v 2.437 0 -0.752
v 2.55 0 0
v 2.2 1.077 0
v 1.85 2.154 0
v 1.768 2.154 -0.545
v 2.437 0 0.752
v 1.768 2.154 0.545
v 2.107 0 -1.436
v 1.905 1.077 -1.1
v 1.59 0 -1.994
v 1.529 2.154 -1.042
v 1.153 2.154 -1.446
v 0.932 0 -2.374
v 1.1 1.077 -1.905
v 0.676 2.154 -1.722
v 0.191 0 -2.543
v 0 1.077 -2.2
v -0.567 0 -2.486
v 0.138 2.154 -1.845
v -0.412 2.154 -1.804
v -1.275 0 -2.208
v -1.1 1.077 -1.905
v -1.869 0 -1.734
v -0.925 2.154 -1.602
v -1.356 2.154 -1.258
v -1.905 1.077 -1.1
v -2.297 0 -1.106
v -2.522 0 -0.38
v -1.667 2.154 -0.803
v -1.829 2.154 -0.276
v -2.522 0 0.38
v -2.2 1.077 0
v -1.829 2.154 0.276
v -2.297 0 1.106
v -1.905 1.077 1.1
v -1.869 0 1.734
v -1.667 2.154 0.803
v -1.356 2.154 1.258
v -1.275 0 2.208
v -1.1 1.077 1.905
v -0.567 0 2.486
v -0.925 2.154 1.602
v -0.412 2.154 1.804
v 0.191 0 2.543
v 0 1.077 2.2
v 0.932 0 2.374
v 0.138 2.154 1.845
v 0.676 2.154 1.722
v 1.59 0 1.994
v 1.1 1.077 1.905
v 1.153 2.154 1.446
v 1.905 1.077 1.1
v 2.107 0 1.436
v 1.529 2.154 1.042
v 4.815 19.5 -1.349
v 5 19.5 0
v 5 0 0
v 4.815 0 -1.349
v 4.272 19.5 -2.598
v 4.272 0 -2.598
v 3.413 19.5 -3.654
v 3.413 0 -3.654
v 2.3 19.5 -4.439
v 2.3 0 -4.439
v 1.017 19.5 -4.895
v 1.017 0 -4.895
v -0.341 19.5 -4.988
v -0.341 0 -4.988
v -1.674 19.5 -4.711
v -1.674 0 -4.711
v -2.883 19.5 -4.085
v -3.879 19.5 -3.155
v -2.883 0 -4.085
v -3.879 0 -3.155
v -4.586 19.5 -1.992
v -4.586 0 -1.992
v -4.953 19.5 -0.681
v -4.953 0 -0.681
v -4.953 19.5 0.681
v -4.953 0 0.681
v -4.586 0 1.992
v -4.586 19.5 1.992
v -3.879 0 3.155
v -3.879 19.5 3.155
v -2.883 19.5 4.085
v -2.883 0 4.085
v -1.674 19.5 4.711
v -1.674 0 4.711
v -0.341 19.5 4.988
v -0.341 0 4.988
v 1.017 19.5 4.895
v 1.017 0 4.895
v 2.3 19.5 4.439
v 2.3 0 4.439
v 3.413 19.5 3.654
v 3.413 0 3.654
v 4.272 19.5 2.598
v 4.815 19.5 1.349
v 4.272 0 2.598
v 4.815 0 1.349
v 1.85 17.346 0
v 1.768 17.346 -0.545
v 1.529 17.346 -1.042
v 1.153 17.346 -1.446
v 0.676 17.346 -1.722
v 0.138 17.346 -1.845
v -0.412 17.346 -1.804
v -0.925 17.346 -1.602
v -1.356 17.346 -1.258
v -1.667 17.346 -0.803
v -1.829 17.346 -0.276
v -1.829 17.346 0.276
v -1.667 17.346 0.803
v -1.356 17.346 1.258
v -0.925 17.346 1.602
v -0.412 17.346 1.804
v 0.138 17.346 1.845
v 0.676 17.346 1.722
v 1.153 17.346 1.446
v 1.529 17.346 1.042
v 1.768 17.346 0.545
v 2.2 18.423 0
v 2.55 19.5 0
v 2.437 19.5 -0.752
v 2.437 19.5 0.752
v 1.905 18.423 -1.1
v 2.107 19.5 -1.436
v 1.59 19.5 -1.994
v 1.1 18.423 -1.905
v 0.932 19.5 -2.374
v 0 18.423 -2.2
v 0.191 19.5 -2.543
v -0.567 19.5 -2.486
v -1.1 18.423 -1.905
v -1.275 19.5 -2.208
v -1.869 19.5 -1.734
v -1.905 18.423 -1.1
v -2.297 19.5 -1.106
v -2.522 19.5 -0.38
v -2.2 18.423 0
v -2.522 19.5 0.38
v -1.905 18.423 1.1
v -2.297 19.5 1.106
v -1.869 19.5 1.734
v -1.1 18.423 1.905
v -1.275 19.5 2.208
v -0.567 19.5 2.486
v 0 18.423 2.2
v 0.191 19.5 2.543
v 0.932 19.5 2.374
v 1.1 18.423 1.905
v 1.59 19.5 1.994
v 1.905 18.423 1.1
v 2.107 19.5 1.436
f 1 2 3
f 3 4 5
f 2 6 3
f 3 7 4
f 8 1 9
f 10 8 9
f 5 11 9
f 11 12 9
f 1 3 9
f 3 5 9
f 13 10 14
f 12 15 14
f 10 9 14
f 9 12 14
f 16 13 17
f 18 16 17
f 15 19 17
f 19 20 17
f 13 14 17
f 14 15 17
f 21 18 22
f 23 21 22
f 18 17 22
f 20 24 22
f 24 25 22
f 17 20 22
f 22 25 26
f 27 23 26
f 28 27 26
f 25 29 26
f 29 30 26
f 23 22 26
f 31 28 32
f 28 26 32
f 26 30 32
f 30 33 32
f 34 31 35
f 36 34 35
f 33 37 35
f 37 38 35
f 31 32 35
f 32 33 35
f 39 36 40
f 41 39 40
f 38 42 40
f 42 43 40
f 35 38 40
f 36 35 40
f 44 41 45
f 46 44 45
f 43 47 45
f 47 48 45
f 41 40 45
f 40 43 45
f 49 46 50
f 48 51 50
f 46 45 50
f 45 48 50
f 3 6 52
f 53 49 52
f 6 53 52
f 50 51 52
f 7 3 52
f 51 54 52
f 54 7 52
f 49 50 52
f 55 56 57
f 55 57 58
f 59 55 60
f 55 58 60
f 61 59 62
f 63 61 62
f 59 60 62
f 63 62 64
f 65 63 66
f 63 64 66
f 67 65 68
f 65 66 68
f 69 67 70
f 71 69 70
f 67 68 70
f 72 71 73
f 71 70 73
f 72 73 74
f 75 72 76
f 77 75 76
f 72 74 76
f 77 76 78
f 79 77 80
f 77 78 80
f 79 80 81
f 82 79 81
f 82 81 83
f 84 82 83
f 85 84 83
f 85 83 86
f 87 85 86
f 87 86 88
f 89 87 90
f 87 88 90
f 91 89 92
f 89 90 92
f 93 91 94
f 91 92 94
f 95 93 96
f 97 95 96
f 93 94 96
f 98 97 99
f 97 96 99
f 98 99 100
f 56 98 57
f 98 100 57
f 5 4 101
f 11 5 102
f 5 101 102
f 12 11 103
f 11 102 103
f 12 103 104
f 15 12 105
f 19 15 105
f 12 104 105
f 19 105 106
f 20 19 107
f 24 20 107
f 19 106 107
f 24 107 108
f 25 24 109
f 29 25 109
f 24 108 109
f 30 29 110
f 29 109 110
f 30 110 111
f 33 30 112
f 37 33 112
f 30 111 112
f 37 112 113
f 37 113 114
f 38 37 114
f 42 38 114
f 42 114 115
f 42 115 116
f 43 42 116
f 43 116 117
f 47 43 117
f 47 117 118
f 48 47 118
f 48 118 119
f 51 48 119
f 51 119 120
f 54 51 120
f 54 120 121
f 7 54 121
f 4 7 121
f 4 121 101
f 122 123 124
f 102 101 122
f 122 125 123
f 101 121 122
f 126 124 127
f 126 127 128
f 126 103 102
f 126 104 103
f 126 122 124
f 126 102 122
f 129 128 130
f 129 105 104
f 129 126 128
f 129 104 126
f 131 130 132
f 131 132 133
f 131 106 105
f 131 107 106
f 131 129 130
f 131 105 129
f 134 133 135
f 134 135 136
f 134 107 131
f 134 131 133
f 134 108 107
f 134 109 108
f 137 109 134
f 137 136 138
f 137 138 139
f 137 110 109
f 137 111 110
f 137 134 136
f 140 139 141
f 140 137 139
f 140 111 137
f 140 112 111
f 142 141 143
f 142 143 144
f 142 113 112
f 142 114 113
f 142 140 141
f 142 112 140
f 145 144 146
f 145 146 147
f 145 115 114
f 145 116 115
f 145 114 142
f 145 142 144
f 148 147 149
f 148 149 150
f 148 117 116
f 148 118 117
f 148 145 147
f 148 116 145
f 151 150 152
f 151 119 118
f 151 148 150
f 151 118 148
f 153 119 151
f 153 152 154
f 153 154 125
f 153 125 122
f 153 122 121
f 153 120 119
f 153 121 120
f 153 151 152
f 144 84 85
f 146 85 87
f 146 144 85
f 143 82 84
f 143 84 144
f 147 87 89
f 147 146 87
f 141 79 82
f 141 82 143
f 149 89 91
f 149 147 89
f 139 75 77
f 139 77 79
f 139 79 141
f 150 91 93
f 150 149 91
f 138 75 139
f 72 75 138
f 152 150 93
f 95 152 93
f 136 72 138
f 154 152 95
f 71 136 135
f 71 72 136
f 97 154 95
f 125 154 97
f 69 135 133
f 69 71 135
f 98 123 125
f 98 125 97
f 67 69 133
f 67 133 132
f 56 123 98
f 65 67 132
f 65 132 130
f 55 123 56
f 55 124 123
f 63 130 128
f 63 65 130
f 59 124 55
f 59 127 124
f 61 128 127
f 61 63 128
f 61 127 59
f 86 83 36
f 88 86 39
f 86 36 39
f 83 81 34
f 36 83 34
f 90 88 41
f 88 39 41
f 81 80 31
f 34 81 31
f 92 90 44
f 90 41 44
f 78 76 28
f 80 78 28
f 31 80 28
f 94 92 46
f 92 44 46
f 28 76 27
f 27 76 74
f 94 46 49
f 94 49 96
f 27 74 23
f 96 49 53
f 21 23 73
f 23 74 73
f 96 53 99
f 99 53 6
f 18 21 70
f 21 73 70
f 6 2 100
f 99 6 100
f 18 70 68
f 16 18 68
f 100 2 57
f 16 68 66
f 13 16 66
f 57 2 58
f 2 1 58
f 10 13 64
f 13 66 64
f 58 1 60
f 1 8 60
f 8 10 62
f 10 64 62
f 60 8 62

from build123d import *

# Parameters (mm, degrees)
SKETCH1_R             = 5
BOSS_EXTRUDE1_DEPTH   = 19.5
SKETCH2_R             = 1.85
CUT_EXTRUDE1_DEPTH    = 26.5
CHAMFER1_SIZE         = 0.7
CHAMFER1_SIZE2        = 2.154378476
CHAMFER1_PART_2_SIZE  = 0.7
CHAMFER1_PART_2_SIZE2 = 2.154378476


with BuildPart() as part:
    # Sketch1 → Boss-Extrude1 (new body)
    with BuildSketch(Plane(origin=(0, 0, 0), x_dir=(1, 0, 0), z_dir=(0, 1, 0))):
        Circle(SKETCH1_R)
    extrude(amount=BOSS_EXTRUDE1_DEPTH)

    # Sketch2 → Cut-Extrude1 (cut)
    with BuildSketch(Plane(origin=(0, 19.5, 0), x_dir=(1, 0, 0), z_dir=(0, 1, 0))):
        Circle(SKETCH2_R)
    extrude(amount=-CUT_EXTRUDE1_DEPTH, mode=Mode.SUBTRACT)

    # Chamfer1
    chamfer1_edges = [part.edges().sort_by_distance(p)[0] for p in [
        (-1.85, 0, 0),
    ]]
    chamfer1_side = [part.faces().sort_by_distance(p)[0] for p in [
        (-4.858578644, 0, 0),
    ]]
    chamfer(chamfer1_edges, length=CHAMFER1_SIZE, length2=CHAMFER1_SIZE2, reference=chamfer1_side[0])

    # Chamfer1 part 2
    chamfer1_part_2_edges = [part.edges().sort_by_distance(p)[0] for p in [
        (-1.85, 19.5, 0),
    ]]
    chamfer1_part_2_side = [part.faces().sort_by_distance(p)[0] for p in [
        (-4.858578644, 19.5, 0),
    ]]
    chamfer(chamfer1_part_2_edges, length=CHAMFER1_PART_2_SIZE, length2=CHAMFER1_PART_2_SIZE2, reference=chamfer1_part_2_side[0])


solid = part.part
